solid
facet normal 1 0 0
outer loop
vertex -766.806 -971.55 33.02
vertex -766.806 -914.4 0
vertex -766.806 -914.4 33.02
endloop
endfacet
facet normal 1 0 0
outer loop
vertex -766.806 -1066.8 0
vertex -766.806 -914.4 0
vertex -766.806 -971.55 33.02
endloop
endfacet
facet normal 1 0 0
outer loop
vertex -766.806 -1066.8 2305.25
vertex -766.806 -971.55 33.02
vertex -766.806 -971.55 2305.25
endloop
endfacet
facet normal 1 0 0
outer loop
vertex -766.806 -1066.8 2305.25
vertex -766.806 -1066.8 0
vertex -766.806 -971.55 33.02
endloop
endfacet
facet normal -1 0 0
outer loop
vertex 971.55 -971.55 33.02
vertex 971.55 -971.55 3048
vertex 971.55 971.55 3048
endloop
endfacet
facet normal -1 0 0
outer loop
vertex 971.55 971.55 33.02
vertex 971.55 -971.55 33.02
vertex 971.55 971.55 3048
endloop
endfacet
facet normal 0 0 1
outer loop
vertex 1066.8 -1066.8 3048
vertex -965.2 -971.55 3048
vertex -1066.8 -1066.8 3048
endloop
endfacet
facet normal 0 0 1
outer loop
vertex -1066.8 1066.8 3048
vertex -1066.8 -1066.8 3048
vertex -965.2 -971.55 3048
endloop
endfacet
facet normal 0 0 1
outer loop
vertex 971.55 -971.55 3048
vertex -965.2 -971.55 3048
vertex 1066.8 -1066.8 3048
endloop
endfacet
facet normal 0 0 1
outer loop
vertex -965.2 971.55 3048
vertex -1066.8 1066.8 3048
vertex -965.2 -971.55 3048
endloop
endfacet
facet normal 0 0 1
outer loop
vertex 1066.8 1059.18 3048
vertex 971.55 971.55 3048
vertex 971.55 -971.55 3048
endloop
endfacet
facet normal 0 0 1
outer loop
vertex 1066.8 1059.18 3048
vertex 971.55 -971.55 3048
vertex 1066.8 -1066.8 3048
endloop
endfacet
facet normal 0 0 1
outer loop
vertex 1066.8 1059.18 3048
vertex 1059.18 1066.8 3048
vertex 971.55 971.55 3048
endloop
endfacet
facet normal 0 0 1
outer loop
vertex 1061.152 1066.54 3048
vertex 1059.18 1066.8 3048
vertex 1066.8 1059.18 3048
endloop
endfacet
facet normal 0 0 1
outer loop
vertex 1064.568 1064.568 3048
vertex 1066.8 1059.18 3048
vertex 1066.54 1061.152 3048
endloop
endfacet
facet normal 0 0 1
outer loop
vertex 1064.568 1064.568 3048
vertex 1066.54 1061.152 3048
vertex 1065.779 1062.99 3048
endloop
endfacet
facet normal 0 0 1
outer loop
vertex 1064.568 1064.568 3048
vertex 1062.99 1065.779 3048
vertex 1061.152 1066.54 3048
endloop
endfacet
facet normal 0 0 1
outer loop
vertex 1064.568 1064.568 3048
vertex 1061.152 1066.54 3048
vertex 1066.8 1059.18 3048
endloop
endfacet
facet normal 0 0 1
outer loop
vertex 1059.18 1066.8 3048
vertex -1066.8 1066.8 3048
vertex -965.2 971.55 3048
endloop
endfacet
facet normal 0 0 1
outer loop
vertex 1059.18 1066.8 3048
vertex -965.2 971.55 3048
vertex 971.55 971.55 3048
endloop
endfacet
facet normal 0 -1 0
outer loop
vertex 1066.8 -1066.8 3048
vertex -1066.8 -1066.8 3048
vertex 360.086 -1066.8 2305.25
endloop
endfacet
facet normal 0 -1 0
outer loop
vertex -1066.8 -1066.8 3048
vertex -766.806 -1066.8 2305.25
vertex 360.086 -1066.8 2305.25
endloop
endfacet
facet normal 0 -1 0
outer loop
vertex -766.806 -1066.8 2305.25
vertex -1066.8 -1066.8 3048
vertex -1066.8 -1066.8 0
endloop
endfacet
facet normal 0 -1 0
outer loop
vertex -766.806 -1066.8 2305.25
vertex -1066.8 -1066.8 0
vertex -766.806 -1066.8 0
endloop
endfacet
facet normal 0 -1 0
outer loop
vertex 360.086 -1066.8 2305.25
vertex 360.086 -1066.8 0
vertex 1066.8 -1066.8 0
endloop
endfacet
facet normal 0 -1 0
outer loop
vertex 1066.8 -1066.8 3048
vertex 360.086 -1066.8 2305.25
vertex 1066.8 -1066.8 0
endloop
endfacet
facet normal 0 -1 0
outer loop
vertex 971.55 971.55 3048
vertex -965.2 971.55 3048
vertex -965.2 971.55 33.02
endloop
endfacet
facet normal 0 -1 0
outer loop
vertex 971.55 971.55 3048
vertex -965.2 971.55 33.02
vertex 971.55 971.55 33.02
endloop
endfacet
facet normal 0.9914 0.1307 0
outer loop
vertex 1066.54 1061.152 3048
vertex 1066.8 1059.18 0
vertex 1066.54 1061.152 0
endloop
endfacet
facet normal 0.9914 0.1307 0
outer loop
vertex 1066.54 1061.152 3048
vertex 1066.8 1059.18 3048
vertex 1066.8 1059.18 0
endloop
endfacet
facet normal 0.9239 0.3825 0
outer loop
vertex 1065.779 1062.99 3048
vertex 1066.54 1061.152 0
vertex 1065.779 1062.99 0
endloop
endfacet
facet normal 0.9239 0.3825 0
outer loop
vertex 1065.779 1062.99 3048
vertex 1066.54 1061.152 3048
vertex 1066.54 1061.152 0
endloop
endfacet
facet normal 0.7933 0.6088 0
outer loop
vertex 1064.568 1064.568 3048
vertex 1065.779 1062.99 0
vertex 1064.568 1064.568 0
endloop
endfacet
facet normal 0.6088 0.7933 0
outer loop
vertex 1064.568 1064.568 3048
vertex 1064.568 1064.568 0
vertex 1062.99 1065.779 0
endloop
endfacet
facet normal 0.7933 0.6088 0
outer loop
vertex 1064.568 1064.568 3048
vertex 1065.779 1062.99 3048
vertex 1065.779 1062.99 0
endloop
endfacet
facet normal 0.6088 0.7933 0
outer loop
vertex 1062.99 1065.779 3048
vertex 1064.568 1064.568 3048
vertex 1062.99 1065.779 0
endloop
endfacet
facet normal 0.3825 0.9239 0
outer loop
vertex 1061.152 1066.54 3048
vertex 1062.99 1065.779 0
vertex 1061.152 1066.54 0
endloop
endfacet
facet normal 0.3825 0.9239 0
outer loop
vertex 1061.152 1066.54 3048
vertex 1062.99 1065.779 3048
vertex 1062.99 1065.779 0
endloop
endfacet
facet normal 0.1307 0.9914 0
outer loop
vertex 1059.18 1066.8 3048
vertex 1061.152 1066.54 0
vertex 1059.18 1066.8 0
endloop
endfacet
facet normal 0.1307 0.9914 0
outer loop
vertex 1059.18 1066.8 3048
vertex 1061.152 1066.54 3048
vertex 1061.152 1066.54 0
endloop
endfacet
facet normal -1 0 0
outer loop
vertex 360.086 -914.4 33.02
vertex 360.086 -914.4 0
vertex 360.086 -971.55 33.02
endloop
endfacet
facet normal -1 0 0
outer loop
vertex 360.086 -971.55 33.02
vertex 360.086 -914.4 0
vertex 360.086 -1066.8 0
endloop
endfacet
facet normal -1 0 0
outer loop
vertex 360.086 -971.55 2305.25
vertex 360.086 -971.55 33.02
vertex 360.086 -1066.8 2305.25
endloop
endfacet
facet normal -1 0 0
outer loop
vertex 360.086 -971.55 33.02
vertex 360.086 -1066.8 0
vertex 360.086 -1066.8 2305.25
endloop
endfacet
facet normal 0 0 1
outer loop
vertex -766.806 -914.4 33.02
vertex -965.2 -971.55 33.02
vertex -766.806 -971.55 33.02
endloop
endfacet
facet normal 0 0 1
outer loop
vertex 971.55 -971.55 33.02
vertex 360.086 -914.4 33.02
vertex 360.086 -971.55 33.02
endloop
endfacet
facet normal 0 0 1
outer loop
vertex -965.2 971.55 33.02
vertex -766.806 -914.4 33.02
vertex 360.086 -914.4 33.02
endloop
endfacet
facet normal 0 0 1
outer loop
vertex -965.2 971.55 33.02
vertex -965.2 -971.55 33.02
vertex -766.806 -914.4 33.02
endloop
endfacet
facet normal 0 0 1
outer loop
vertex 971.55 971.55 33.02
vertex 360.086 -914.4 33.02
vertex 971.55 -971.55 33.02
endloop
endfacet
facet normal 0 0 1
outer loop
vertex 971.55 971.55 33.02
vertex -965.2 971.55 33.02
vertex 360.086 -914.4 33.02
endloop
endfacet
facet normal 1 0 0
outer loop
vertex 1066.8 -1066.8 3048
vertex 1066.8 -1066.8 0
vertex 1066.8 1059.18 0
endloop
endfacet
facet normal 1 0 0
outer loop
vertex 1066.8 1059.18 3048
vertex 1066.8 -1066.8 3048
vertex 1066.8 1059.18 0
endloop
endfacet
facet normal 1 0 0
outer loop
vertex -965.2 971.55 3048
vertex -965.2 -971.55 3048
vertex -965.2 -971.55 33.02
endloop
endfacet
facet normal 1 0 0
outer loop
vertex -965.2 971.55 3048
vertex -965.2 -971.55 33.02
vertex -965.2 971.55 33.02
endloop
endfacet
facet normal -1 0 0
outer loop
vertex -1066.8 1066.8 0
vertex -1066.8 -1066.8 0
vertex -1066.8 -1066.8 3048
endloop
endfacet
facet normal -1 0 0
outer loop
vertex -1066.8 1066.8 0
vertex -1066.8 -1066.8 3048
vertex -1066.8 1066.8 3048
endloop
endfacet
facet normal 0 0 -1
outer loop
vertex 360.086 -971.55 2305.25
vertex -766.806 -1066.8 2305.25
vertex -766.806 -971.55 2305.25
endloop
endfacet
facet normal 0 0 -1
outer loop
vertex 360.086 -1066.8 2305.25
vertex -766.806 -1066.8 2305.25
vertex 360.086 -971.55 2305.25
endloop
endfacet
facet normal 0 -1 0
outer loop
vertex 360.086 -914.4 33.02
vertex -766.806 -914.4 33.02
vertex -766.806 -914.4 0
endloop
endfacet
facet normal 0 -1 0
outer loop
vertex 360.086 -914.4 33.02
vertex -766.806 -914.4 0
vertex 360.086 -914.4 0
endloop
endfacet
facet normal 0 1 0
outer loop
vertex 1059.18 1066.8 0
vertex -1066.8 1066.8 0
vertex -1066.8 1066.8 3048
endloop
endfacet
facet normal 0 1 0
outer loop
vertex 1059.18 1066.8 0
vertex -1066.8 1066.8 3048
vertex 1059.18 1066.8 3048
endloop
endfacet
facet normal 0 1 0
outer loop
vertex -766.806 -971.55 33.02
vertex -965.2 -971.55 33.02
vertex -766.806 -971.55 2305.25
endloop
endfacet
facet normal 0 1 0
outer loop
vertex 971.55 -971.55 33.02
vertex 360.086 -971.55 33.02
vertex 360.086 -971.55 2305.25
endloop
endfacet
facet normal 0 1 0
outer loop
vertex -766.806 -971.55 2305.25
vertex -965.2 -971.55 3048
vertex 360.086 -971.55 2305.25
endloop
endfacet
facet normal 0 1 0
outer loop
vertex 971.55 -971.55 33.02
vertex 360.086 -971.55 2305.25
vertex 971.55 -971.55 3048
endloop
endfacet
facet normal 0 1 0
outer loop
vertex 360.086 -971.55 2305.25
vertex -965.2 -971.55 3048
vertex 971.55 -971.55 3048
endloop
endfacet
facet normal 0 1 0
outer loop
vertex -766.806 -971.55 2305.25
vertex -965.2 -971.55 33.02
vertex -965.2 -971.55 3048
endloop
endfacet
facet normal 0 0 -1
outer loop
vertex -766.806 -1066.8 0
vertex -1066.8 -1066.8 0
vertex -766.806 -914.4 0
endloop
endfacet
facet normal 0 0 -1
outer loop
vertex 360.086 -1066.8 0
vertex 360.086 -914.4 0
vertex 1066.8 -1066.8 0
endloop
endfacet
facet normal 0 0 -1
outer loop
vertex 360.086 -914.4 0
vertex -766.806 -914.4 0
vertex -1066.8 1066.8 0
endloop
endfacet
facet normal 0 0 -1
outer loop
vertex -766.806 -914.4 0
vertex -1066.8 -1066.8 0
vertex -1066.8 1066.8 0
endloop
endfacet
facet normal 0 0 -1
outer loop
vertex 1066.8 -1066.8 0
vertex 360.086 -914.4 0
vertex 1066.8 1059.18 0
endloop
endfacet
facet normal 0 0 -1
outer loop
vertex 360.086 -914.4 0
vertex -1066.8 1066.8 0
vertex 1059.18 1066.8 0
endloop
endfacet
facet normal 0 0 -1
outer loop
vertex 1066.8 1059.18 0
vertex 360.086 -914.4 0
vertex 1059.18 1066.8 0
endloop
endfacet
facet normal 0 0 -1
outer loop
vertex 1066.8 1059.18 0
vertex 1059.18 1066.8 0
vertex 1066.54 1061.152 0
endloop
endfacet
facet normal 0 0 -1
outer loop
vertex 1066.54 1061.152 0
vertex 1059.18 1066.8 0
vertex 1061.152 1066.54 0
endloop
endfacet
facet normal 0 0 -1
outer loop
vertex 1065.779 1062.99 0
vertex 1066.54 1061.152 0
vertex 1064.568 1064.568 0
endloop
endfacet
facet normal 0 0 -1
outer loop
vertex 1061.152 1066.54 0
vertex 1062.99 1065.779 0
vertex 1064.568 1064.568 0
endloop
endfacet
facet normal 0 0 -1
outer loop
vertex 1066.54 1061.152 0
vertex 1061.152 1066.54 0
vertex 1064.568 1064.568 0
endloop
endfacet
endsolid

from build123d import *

# Parameters (mm, degrees)
F0_W     = 2133.6
F0_H     = 2133.6
F1_DEPTH = 3048
F2_W     = 1936.75
F2_H     = 1943.1
F3_DEPTH = 2590.8
F4_W     = 1126.8922686577
F4_H     = 4410.2913886309
F5_DEPTH = 152.4
F6_DEPTH = 424.18
F7_R     = 7.62


with BuildPart() as f1:
    # F0 (on Top) → F1 (new body)
    with BuildSketch(Plane.XY):
        Rectangle(F0_W, F0_H)
    extrude(amount=F1_DEPTH)

    # F2 (on face) → F3 (cut)
    with BuildSketch(Plane.XY.offset(3048)):
        with Locations((3.175, 0)):
            Rectangle(F2_W, F2_H)
    extrude(amount=-F3_DEPTH, mode=Mode.SUBTRACT)

    # F4 (on face) → F5 (cut)
    with BuildSketch(Plane.XZ.offset(1066.8)):
        with Locations((-203.3596634865, 100.1044735312)):
            Rectangle(F4_W, F4_H)
    extrude(amount=-F5_DEPTH, mode=Mode.SUBTRACT)

    # F6 (cut): a face of the model
    f6_faces = [f1.faces().sort_by_distance(p)[0] for p in [
        (6.7709971894, 16.4182389166, 457.2),
    ]]
    extrude(f6_faces, amount=-F6_DEPTH, mode=Mode.SUBTRACT)

    # F7
    f7_edges = [f1.edges().sort_by_distance(p)[0] for p in [
        (1066.8, 1066.8, 1524),
    ]]
    fillet(f7_edges, radius=F7_R)


solid = f1.part
